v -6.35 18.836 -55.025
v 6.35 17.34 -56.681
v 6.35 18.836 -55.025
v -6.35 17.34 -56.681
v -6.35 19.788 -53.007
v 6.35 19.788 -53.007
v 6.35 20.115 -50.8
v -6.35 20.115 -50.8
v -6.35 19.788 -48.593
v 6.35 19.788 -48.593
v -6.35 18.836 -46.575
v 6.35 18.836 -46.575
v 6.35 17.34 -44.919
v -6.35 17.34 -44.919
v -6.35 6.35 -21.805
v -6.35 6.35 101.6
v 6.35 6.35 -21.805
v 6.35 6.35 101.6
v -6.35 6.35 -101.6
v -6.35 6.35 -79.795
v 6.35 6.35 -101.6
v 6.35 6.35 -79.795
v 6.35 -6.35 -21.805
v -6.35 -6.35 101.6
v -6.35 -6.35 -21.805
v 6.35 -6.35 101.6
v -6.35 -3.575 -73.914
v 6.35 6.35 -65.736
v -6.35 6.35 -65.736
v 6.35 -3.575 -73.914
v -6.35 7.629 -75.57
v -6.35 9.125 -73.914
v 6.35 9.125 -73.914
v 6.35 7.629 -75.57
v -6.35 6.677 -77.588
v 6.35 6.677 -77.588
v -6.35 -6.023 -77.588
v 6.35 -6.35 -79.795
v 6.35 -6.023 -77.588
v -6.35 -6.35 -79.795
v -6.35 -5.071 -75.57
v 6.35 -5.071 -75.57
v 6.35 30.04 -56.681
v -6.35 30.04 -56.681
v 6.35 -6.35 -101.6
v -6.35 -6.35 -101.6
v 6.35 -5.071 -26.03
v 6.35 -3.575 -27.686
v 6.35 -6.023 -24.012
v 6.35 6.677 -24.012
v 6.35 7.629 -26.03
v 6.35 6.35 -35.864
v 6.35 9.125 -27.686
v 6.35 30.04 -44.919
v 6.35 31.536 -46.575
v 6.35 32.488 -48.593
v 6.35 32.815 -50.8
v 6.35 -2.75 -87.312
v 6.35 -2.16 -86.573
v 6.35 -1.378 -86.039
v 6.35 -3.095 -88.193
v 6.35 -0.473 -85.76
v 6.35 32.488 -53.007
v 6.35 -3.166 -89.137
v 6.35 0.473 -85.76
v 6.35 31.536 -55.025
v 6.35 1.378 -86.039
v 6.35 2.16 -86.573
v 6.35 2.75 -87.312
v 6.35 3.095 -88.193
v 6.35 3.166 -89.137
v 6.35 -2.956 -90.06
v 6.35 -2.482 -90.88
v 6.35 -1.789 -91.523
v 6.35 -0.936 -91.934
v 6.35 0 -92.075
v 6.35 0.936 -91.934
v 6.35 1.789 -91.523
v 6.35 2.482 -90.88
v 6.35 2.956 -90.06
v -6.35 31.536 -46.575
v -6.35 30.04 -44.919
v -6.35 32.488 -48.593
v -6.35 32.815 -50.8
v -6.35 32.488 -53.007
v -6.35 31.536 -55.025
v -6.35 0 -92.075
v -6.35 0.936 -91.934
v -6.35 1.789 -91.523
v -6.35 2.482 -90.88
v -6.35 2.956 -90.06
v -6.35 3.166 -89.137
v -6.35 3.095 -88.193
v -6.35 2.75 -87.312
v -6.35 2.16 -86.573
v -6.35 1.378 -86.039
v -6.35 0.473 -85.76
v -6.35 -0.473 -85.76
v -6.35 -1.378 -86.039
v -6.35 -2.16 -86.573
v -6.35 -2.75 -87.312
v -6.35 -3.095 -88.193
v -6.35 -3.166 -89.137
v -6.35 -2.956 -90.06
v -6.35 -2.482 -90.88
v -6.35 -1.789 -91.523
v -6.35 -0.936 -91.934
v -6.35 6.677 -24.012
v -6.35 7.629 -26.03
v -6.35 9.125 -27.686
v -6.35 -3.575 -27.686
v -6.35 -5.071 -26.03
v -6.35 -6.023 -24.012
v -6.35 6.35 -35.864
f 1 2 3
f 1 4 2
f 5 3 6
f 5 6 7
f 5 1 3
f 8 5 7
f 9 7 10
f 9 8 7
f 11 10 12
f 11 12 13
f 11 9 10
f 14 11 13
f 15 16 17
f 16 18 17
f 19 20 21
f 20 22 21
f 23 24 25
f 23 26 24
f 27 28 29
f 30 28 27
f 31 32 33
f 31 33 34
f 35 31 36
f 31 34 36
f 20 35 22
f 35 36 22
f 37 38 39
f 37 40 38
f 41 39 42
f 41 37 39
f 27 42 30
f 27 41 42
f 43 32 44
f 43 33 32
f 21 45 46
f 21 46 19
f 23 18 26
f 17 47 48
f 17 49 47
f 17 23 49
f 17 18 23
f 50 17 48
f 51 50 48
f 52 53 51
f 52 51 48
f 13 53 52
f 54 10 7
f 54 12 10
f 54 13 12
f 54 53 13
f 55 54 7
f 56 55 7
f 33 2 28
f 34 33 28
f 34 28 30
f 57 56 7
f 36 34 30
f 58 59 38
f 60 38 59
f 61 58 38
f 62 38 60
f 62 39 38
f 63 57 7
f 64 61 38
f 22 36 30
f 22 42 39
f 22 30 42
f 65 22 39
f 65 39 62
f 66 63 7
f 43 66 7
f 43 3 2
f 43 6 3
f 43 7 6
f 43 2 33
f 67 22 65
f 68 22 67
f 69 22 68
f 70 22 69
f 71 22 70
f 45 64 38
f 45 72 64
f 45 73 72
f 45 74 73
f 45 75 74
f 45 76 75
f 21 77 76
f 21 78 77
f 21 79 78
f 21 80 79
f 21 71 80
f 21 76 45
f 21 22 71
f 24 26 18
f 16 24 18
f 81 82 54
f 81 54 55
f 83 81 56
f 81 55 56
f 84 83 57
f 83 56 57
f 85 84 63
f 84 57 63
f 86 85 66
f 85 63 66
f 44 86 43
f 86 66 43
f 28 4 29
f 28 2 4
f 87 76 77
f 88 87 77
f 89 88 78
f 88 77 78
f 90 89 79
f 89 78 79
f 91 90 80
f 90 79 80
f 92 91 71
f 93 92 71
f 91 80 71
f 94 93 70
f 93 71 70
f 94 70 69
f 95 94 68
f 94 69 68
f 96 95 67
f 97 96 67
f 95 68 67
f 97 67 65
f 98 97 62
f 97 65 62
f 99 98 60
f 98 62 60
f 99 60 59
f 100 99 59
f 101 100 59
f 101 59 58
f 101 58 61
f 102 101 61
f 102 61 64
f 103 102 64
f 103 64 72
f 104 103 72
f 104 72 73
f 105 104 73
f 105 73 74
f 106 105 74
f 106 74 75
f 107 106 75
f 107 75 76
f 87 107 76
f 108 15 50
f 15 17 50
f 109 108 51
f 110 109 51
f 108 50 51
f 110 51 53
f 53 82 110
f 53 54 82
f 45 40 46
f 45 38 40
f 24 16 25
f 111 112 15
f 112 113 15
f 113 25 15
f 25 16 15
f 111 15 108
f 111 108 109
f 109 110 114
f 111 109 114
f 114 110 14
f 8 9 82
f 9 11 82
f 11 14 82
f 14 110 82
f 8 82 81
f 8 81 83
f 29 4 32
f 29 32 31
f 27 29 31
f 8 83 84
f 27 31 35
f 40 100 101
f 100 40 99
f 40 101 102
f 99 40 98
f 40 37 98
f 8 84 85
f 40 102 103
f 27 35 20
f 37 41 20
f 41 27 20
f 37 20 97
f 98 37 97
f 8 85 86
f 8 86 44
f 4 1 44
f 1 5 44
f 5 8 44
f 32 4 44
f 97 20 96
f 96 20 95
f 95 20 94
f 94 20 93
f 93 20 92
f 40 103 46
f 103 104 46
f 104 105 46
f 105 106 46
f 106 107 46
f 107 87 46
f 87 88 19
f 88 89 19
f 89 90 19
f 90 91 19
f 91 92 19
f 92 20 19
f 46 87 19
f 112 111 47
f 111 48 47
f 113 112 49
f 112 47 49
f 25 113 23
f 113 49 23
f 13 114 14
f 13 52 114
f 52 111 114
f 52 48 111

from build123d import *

# Parameters (mm, degrees)
SKETCH3_W           = 25.4
SKETCH3_H           = 12.7
SKETCH3_W_2         = 127
BOSS_EXTRUDE1_DEPTH = 6.35
FILLET1_R           = 7.62
SKETCH5_R           = 3.175
CUT_EXTRUDE2_DEPTH  = 13.7


with BuildPart() as part:
    # Sketch3 → Boss-Extrude1 (new body, symmetric)
    with BuildSketch(Plane(origin=(0, 0, 0), x_dir=(0, 0, -1), z_dir=(1, 0, 0))):
        with Locations((88.9, 0)):
            Rectangle(SKETCH3_W, SKETCH3_H)
        Polygon((76.2, 6.35), (50.8, 37.177887789), (50.8, 24.477887789), (65.736097893, 6.35), align=None)
        Polygon((65.736097893, 6.35), (76.2, -6.35), (76.2, 6.35), align=None)
        Polygon((50.8, 37.177887789), (25.4, 6.35), (35.863902107, 6.35), (50.8, 24.477887789), align=None)
        Polygon((35.863902107, 6.35), (25.4, 6.35), (25.4, -6.35), align=None)
        with Locations((-38.1, 0)):
            Rectangle(SKETCH3_W_2, SKETCH3_H)
    extrude(amount=BOSS_EXTRUDE1_DEPTH, both=True)

    # Fillet1
    fillet1_edges = [part.edges().sort_by_distance(p)[0] for p in [
        (0, -6.35, -76.2),
        (0, 24.477887789, -50.8),
        (0, -6.35, -25.4),
        (0, 6.35, -25.4),
        (0, 37.177887789, -50.8),
        (0, 6.35, -76.2),
    ]]
    fillet(fillet1_edges, radius=FILLET1_R)

    # Sketch5 → Cut-Extrude2 (cut, through all)
    with BuildSketch(Plane(origin=(6.35, 0, 0), x_dir=(0, 0, -1), z_dir=(1, 0, 0))):
        with Locations((88.9, 0)):
            Circle(SKETCH5_R)
    extrude(amount=-CUT_EXTRUDE2_DEPTH, mode=Mode.SUBTRACT)


solid = part.part
